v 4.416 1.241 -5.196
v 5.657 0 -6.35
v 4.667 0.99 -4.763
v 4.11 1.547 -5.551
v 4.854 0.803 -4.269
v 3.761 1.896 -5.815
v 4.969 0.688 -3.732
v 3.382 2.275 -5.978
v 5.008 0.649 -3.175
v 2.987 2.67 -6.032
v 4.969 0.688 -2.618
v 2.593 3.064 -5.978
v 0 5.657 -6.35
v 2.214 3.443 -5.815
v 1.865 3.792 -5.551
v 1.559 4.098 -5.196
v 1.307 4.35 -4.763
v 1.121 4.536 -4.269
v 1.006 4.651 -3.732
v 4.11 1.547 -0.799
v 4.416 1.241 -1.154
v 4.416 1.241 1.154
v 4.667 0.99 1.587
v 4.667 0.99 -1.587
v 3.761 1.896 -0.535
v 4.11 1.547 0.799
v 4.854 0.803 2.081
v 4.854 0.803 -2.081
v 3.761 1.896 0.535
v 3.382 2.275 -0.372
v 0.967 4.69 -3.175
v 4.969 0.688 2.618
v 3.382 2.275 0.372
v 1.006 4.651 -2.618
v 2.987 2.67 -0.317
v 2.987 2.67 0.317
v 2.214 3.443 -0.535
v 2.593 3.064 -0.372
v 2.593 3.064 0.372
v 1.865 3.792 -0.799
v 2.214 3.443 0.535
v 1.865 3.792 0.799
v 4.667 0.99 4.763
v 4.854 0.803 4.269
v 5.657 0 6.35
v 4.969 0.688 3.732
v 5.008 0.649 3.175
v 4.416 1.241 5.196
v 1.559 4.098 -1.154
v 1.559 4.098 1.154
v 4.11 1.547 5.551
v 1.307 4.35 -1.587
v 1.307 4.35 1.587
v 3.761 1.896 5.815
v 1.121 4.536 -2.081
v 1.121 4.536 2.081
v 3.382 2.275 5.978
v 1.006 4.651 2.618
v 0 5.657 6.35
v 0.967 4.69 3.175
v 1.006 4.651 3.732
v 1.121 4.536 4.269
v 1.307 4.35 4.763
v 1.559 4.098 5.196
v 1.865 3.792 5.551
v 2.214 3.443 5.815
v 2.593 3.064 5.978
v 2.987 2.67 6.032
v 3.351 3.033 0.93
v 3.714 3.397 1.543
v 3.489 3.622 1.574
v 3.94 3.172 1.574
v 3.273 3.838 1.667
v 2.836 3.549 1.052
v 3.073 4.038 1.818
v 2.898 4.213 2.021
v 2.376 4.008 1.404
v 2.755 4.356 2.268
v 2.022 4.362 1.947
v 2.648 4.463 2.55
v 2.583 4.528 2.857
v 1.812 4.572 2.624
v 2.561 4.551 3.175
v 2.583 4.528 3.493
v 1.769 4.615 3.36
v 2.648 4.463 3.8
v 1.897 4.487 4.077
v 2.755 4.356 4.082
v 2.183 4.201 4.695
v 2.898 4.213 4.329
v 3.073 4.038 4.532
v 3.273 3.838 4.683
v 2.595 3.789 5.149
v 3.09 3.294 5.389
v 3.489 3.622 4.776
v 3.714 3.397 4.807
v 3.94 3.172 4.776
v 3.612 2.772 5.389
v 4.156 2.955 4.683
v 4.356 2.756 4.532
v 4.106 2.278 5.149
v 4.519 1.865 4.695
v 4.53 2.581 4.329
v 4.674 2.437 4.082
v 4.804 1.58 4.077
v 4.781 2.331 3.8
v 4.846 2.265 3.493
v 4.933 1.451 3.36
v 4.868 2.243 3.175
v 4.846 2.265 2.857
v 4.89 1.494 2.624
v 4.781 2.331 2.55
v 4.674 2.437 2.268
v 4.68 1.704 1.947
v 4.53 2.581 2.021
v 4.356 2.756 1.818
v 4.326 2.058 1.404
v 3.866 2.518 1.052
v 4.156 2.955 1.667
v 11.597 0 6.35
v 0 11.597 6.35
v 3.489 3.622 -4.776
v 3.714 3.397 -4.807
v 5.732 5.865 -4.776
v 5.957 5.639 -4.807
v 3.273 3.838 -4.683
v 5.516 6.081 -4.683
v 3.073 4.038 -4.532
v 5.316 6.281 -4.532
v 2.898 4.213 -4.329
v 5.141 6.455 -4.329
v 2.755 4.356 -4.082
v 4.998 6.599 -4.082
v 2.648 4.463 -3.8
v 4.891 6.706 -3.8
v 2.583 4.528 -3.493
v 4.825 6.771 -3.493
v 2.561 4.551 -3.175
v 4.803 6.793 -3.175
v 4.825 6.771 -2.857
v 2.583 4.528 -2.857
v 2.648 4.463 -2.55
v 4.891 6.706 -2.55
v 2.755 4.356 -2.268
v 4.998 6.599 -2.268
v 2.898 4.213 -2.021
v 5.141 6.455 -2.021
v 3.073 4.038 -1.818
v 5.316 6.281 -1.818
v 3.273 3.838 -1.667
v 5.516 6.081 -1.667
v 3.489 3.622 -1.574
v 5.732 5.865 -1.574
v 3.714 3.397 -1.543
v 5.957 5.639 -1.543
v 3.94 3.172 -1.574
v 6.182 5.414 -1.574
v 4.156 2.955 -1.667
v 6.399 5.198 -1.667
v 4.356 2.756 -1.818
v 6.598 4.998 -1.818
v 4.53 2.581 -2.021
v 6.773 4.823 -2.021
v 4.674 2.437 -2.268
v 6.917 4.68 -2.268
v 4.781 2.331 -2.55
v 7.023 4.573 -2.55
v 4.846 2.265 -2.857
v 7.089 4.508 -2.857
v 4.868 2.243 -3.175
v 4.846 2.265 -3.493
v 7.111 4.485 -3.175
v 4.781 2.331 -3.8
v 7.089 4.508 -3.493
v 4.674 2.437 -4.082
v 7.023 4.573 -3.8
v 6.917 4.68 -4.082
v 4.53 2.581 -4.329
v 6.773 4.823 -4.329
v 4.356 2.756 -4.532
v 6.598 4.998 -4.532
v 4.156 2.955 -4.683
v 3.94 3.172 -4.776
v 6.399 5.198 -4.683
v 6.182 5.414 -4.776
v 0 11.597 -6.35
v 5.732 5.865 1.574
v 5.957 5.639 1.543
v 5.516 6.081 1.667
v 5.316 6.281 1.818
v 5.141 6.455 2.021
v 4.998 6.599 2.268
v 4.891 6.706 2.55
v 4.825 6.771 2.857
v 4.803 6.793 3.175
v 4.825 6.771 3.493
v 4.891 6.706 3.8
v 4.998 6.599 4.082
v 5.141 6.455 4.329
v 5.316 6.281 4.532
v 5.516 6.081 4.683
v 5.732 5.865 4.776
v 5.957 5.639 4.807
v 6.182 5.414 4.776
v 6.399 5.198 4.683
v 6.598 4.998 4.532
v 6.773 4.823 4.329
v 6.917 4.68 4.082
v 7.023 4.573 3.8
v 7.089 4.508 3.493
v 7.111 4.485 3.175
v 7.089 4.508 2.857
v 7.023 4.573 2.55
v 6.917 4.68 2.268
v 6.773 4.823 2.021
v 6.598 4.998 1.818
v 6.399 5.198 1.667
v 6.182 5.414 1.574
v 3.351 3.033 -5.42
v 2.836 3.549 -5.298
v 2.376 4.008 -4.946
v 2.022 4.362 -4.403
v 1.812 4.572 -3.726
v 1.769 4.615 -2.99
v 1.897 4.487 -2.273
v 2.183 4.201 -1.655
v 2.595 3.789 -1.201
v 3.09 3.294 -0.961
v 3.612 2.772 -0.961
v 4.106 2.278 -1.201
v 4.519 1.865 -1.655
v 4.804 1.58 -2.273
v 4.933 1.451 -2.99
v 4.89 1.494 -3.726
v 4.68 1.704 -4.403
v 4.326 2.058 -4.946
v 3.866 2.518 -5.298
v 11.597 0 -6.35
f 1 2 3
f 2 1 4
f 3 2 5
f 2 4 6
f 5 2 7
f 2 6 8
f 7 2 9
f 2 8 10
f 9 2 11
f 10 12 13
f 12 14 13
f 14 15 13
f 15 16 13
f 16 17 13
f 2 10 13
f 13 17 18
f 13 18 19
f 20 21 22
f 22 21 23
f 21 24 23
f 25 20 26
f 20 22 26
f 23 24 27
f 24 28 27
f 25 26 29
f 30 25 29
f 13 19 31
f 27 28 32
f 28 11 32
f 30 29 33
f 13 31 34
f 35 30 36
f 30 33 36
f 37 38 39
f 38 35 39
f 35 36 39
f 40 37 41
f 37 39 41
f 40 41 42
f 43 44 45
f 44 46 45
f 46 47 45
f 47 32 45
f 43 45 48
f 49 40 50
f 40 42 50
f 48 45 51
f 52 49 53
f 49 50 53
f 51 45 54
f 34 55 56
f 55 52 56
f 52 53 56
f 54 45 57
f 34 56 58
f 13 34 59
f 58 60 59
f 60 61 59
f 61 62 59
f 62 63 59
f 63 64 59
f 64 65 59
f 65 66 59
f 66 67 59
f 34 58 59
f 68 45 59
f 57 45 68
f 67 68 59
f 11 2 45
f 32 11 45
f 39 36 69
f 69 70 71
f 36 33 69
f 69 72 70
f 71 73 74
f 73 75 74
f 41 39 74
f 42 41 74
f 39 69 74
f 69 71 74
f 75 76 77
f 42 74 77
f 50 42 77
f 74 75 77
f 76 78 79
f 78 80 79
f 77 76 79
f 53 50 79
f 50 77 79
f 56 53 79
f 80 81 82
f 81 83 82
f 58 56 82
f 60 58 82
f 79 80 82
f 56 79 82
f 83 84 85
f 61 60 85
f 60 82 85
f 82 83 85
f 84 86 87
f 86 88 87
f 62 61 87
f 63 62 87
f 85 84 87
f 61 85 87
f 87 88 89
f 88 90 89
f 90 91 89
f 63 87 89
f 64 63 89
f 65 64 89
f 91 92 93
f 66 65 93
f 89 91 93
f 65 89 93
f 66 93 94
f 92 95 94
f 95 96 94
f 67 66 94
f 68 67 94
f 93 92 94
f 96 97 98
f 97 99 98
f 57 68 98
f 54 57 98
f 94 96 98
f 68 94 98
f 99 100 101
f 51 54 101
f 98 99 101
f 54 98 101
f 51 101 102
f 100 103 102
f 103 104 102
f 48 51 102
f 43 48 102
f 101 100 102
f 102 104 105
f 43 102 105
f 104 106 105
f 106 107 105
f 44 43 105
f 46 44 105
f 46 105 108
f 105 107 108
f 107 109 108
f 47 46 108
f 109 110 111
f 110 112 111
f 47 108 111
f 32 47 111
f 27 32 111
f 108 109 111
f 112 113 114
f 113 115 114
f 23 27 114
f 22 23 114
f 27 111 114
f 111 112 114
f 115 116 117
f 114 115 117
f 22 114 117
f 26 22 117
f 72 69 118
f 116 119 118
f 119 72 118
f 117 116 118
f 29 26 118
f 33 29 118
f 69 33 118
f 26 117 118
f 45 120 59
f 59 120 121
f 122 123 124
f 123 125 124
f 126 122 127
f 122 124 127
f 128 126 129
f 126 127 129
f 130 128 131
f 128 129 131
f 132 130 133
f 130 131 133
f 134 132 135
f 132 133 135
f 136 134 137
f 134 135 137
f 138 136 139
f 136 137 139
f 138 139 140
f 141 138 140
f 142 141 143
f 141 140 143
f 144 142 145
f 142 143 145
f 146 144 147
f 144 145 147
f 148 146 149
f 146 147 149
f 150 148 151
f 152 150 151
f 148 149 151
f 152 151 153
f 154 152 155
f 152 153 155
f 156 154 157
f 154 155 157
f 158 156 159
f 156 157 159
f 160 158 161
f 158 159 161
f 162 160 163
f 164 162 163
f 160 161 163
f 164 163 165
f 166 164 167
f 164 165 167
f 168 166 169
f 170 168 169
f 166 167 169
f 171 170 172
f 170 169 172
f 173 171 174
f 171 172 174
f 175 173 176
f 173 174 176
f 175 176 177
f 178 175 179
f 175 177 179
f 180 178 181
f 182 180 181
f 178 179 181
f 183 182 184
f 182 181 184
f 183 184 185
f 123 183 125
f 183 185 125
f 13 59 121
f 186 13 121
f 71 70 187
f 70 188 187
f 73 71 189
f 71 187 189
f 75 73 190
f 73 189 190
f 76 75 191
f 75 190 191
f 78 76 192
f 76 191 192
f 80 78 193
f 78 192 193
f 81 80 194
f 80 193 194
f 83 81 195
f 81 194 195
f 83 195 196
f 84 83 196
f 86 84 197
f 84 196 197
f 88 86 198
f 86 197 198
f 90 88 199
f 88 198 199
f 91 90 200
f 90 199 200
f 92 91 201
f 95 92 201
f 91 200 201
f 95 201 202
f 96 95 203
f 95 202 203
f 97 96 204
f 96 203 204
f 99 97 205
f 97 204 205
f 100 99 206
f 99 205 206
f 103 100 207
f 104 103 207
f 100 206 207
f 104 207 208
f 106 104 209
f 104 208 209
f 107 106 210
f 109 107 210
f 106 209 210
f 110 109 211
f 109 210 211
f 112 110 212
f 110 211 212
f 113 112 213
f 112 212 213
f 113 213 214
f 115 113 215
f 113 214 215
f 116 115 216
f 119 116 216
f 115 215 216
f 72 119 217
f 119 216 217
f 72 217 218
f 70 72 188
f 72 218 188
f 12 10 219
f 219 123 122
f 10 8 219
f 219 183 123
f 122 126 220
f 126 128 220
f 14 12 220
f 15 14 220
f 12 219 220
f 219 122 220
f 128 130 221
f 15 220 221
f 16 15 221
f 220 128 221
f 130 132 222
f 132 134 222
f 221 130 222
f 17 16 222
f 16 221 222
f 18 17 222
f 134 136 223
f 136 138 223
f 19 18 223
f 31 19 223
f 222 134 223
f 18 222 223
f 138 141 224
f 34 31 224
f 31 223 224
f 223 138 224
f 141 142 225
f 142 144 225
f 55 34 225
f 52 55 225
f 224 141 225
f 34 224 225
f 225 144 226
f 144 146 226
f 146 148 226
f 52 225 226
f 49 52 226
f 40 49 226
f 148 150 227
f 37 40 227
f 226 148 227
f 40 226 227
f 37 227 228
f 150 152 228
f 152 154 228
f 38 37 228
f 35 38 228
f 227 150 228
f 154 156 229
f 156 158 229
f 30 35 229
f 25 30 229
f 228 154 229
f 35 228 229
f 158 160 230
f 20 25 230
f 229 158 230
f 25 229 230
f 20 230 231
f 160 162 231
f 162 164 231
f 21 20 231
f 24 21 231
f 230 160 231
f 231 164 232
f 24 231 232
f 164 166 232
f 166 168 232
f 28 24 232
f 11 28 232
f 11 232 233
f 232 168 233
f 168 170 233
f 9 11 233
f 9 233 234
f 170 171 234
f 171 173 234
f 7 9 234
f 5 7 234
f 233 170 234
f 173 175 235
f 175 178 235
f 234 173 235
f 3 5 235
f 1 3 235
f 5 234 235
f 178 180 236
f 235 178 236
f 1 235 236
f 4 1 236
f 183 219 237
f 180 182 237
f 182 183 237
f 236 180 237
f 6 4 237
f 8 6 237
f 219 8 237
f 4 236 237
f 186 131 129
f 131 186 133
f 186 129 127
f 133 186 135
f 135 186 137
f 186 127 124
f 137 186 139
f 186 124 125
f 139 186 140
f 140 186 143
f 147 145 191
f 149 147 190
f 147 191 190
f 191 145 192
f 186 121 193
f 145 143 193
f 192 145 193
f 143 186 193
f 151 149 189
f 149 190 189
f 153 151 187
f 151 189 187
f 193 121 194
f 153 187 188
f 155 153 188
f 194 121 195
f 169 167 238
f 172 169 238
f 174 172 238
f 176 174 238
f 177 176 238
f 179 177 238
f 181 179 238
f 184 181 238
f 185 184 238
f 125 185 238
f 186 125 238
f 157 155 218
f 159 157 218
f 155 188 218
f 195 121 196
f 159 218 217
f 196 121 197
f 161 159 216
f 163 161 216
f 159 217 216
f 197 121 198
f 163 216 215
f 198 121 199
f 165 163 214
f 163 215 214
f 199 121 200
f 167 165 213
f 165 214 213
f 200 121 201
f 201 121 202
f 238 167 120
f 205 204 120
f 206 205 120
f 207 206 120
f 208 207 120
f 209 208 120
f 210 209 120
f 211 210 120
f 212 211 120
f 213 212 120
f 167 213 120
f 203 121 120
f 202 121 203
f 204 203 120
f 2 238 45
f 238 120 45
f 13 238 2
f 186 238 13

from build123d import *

# Parameters (mm, degrees)
BOSS_EXTRUDE1_DEPTH                               = 6.35
CSK_FOR_4_FLAT_HEAD_MACHINE_SCREW_100_D           = 3.2639
CSK_FOR_4_FLAT_HEAD_MACHINE_SCREW_100_CSINK_D     = 5.715
CSK_FOR_4_FLAT_HEAD_MACHINE_SCREW_100_CSINK_ANGLE = 100


with BuildPart() as part:
    # Sketch1 → Boss-Extrude1 (new body, symmetric)
    with BuildSketch(Plane.XY):
        Polygon((0, 11.596551211), (11.596551211, 0), (5.656854249, 0), (0, 5.656854249), align=None)
    extrude(amount=BOSS_EXTRUDE1_DEPTH, both=True)

    # CSK for #4 Flat Head Machine Screw (100)1 (through all)
    with Locations(Plane(origin=(2.828427125, 2.828427125, 0), x_dir=(0, 0, 1), z_dir=(-0.707106781, -0.707106781, 0))):
        with Locations((-3.175, -0.224693873), (3.175, -0.224693873)):
            CounterSinkHole(CSK_FOR_4_FLAT_HEAD_MACHINE_SCREW_100_D / 2, CSK_FOR_4_FLAT_HEAD_MACHINE_SCREW_100_CSINK_D / 2, counter_sink_angle=CSK_FOR_4_FLAT_HEAD_MACHINE_SCREW_100_CSINK_ANGLE)


solid = part.part
